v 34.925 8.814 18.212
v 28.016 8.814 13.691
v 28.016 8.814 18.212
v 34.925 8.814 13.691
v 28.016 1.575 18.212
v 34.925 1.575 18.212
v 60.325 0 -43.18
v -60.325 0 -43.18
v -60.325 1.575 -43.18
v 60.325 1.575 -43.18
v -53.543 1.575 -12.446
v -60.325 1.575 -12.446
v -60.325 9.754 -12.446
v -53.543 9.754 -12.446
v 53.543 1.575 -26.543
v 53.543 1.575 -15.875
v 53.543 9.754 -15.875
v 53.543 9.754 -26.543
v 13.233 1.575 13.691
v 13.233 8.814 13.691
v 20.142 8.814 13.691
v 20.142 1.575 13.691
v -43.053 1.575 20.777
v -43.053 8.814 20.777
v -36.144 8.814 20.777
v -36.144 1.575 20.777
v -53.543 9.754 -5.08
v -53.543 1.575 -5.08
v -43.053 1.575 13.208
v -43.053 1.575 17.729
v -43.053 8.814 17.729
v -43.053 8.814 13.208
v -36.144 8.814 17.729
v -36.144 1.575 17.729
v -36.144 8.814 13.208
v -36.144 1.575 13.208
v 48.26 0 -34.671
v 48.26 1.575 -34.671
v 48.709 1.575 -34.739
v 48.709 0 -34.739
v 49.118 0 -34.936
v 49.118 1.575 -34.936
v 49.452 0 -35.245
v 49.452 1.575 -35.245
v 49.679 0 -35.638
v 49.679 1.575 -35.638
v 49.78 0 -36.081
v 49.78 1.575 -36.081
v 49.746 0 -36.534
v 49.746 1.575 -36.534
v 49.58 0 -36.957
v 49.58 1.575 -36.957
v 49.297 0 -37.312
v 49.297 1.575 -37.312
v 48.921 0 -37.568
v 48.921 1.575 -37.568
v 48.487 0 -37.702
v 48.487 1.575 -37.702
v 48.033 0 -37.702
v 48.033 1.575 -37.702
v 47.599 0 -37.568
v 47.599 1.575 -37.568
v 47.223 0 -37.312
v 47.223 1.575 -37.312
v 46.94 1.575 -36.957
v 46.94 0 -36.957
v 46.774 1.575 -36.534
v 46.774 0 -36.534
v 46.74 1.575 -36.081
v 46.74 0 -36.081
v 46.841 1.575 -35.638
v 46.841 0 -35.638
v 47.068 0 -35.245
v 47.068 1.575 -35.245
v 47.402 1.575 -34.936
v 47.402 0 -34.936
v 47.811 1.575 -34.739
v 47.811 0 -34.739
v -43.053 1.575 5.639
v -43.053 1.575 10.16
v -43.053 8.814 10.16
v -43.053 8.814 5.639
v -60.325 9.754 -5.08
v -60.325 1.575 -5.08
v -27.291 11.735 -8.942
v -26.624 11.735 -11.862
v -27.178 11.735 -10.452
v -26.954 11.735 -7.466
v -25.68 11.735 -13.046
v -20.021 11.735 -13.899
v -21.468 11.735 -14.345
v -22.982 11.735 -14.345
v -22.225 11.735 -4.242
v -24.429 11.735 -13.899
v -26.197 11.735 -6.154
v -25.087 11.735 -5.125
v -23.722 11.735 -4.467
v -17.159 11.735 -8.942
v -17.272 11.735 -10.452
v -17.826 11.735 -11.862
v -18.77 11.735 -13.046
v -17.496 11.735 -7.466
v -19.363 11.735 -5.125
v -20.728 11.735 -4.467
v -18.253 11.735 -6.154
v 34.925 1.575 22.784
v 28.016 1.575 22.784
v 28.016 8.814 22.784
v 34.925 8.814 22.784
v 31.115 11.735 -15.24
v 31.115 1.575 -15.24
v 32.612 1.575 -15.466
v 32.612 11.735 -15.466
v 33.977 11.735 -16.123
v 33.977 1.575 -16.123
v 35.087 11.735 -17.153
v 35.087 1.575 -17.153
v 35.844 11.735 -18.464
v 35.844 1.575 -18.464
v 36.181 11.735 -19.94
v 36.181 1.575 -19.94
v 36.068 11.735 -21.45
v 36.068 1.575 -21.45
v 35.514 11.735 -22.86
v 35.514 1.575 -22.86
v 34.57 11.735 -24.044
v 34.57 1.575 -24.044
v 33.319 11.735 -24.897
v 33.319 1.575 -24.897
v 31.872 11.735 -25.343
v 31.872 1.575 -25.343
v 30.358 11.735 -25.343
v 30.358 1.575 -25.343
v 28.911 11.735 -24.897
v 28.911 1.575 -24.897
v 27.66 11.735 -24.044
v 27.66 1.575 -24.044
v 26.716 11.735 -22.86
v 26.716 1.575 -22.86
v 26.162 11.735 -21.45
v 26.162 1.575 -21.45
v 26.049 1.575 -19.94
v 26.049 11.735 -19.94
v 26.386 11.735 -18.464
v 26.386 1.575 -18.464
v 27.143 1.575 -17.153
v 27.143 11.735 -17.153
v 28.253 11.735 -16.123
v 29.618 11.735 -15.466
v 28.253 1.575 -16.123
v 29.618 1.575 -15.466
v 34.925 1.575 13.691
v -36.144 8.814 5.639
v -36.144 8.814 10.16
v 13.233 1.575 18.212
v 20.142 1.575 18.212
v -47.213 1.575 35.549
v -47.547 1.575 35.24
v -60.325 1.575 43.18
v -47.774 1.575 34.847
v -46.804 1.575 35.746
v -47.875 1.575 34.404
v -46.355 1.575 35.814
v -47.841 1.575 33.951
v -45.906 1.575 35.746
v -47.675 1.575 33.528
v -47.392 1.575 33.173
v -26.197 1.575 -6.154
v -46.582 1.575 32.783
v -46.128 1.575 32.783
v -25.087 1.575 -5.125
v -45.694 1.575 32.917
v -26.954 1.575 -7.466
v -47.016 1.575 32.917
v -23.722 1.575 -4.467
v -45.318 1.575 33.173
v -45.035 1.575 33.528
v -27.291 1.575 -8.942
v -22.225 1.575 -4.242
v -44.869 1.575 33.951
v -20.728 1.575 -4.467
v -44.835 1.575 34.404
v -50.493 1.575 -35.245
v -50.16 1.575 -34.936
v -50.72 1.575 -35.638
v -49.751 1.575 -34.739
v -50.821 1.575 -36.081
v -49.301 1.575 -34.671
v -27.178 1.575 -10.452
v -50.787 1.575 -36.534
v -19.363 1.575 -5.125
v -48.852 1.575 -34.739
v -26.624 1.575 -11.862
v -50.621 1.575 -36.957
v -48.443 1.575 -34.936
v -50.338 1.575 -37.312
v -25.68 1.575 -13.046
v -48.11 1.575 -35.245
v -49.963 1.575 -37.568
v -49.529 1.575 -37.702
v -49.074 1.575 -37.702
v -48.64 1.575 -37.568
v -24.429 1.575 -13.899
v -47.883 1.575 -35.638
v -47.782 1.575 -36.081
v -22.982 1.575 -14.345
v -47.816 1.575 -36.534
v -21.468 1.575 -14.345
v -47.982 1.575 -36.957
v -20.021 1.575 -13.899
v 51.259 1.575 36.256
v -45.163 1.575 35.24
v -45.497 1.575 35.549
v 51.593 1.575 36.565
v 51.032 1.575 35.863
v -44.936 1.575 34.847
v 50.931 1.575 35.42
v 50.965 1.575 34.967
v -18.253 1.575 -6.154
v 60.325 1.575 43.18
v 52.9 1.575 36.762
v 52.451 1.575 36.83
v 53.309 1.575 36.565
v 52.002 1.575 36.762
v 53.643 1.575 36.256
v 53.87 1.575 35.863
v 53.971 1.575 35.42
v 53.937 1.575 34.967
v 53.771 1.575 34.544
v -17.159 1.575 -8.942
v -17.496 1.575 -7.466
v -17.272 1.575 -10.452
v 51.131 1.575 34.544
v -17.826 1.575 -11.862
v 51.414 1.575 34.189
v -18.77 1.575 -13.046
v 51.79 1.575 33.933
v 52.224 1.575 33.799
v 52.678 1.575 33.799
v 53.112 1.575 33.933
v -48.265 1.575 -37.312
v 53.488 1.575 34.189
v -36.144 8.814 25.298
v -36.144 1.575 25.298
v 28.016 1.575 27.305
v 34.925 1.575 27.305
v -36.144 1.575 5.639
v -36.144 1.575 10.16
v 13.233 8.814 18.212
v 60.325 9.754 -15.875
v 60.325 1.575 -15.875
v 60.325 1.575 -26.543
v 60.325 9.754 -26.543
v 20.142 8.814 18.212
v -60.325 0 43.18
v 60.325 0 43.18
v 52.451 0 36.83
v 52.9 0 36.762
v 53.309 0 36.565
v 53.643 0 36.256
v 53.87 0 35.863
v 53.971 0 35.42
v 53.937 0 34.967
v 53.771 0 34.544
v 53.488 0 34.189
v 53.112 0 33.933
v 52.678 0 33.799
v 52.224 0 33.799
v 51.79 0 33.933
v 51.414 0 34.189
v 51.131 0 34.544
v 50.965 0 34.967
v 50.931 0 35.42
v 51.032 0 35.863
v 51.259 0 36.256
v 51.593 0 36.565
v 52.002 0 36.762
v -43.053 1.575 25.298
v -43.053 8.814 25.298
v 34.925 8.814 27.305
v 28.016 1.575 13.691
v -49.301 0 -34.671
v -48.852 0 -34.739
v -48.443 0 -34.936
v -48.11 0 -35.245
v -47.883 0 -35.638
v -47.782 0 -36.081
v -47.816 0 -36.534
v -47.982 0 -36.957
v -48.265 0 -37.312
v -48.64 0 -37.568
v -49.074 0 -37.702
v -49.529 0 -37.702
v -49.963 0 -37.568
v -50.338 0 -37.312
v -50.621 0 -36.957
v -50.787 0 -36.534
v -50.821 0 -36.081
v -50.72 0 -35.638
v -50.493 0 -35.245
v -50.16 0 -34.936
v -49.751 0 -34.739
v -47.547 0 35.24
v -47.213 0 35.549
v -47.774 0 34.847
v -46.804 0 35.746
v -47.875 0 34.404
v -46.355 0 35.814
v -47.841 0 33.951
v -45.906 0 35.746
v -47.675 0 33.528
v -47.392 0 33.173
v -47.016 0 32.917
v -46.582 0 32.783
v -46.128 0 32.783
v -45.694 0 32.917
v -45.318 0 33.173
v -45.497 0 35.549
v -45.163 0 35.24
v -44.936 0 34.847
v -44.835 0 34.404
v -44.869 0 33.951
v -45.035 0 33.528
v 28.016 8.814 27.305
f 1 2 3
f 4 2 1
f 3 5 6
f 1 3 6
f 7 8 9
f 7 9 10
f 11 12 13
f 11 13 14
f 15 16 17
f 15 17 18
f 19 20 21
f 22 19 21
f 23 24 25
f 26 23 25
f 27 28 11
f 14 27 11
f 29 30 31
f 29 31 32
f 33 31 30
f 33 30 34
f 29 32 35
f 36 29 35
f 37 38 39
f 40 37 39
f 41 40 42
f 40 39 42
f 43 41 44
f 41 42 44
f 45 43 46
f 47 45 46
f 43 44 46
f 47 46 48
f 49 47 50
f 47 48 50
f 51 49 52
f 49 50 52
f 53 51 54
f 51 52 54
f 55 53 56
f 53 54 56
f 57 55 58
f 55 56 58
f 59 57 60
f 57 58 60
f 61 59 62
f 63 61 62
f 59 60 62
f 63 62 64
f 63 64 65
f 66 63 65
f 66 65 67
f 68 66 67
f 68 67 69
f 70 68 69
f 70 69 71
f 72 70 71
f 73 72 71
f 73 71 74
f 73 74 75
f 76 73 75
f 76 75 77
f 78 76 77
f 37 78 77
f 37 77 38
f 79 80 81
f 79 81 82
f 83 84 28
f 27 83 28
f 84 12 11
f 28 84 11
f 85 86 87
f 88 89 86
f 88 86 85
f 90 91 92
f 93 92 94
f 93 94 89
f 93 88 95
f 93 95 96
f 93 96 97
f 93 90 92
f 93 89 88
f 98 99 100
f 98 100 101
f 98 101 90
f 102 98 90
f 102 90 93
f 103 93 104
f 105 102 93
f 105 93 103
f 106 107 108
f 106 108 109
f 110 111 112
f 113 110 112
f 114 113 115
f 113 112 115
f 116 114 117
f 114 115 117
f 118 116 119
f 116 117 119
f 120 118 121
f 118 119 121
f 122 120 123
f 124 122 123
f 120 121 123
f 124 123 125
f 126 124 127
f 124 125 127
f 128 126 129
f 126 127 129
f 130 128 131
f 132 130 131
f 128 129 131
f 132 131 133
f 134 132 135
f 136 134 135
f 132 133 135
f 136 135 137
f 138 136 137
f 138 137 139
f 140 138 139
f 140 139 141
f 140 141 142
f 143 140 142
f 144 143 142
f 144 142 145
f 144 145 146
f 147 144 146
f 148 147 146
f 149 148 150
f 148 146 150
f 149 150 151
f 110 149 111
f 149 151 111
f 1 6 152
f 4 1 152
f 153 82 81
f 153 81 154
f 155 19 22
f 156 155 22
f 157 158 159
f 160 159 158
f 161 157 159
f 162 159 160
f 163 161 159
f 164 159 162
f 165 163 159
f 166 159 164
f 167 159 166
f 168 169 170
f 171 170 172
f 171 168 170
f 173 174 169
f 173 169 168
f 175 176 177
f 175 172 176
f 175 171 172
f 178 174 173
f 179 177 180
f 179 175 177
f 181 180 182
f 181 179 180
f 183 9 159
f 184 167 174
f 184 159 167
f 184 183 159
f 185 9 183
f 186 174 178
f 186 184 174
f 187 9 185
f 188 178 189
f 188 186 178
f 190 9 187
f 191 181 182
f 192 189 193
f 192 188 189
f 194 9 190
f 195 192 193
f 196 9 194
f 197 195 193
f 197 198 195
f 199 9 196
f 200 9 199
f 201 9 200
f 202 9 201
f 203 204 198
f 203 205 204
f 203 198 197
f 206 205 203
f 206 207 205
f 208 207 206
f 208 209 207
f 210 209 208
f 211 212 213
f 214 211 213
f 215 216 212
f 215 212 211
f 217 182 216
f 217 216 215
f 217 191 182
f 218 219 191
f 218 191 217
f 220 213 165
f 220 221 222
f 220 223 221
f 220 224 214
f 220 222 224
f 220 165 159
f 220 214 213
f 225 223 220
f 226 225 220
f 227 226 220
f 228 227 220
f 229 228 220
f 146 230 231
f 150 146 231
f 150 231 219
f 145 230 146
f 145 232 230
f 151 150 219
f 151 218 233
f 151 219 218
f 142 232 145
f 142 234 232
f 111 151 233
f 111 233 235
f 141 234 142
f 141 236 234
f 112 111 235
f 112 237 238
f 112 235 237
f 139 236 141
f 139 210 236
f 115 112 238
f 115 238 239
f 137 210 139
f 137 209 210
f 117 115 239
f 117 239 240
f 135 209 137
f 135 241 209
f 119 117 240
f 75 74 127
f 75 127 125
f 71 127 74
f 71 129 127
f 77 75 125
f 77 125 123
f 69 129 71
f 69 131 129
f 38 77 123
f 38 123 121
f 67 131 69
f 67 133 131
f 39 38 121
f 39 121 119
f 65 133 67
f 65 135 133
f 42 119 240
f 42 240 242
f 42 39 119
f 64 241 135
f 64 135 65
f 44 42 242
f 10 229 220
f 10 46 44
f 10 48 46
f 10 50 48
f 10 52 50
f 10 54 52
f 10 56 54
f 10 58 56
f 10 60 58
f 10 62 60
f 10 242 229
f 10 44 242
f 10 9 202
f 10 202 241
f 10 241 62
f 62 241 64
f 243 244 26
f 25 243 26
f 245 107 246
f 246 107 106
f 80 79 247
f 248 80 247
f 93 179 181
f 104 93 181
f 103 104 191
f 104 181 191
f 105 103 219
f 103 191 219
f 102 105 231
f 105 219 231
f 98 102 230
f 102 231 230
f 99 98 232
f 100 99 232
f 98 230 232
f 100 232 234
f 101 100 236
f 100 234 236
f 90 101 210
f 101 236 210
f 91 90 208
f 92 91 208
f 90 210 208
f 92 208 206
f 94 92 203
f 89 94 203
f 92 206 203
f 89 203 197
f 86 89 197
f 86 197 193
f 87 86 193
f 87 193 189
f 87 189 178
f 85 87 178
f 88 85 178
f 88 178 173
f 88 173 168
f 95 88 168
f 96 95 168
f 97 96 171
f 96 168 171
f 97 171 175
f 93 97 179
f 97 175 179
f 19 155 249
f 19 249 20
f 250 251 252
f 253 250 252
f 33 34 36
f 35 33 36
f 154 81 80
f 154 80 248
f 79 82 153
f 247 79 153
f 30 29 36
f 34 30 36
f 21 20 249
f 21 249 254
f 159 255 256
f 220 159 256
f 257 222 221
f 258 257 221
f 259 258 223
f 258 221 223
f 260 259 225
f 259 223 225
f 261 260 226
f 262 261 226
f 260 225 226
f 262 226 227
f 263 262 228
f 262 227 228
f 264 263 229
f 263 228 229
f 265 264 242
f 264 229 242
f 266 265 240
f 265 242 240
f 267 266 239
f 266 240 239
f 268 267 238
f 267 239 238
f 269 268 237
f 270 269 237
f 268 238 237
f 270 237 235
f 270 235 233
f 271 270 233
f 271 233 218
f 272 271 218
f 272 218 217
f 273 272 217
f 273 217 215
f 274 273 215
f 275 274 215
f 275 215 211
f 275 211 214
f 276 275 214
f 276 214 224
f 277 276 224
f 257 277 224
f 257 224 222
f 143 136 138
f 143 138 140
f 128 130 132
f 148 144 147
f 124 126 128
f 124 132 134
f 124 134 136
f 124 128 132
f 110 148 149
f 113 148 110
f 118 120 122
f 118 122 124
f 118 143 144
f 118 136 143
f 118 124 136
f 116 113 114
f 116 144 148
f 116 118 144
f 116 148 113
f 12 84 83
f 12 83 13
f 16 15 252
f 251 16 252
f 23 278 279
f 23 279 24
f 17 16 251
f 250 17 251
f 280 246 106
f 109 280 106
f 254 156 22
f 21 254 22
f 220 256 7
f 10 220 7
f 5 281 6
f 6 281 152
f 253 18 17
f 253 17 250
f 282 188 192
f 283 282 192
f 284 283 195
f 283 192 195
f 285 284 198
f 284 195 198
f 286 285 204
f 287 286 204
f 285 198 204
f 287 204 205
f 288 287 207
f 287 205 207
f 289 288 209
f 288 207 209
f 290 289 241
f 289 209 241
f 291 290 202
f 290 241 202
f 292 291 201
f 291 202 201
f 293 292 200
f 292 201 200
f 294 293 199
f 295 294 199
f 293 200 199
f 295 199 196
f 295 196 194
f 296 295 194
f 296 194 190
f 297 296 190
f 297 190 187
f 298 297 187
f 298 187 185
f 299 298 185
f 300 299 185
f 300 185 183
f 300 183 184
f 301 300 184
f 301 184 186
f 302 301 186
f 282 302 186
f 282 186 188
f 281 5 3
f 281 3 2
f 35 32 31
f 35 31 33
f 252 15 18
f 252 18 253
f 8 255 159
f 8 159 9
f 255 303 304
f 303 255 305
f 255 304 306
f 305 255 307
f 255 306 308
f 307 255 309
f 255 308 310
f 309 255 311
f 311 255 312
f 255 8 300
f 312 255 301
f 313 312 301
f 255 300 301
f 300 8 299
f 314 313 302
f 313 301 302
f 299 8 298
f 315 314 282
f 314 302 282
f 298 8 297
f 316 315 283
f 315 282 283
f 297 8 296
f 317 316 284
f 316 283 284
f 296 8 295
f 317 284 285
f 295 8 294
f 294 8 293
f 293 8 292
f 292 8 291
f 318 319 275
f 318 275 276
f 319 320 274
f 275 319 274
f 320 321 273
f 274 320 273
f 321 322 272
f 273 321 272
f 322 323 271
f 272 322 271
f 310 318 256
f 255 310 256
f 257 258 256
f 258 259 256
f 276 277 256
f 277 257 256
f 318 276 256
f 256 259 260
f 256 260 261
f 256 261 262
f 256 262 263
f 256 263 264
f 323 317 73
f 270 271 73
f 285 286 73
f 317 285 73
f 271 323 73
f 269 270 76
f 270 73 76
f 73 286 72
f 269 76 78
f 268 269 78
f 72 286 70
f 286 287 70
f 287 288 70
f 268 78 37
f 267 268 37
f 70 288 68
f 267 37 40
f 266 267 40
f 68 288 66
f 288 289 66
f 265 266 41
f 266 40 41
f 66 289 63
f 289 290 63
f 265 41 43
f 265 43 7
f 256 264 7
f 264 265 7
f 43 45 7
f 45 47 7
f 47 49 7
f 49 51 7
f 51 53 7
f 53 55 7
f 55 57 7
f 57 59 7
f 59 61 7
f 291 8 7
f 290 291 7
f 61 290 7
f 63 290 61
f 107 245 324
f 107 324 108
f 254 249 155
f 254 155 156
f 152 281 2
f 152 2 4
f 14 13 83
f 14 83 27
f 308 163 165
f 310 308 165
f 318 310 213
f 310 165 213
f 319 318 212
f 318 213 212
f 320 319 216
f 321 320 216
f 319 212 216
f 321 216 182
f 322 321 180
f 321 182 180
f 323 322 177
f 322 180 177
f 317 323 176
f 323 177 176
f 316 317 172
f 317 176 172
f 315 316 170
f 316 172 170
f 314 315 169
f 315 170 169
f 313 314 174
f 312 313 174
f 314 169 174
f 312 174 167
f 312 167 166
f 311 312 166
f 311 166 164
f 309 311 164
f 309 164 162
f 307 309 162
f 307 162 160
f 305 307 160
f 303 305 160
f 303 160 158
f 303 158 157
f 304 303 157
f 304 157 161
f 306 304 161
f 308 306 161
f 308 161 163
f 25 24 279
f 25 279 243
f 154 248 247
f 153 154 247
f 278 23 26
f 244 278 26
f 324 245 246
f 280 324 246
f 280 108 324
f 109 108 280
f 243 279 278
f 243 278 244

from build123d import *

# Parameters (mm, degrees)
SKETCH1_W          = 120.65
SKETCH1_H          = 86.36
PCB_DEPTH          = 1.5748
SKETCH2_R          = 5.08
CAPACITORS_DEPTH   = 10.16
SKETCH3_W          = 6.7818
SKETCH3_H          = 7.366
CONNECTORS_DEPTH   = 8.1788
SKETCH3_H_2        = 10.668
CONNECTORS_2_DEPTH = 8.1788
SKETCH4_W          = 6.9088
SKETCH4_H          = 4.5212
POTS_DEPTH         = 7.239
POTS_2_DEPTH       = 7.239
POTS_3_DEPTH       = 7.239
POTS_4_DEPTH       = 7.239
POTS_5_DEPTH       = 7.239
POTS_6_DEPTH       = 7.239
SKETCH5_R          = 1.524
CUT_EXTRUDE1_DEPTH = 75.878859667


with BuildPart() as part:
    # Sketch1 → PCB (new body)
    with BuildSketch(Plane(origin=(0, 0, 0), x_dir=(1, 0, 0), z_dir=(0, 1, 0))):
        Rectangle(SKETCH1_W, SKETCH1_H)
    extrude(amount=PCB_DEPTH)

    # Sketch2 → Capacitors (add)
    with BuildSketch(Plane(origin=(0, 1.5748, 0), x_dir=(1, 0, 0), z_dir=(0, 1, 0))):
        with Locations(Location((-22.225, 9.3218, 0), (0, 0, 270))):
            Circle(SKETCH2_R)
        with Locations(Location((31.115, 20.32, 0), (0, 0, 270))):
            Circle(SKETCH2_R)
    extrude(amount=CAPACITORS_DEPTH)

    # Sketch5 → Cut-Extrude1 (cut, through all)
    with BuildSketch(Plane(origin=(0, 1.5748, 0), x_dir=(1, 0, 0), z_dir=(0, 1, 0))):
        with Locations(Location((-49.3014, 36.195, 0), (0, 0, 270))):
            Circle(SKETCH5_R)
        with Locations(Location((48.26, 36.195, 0), (0, 0, 270))):
            Circle(SKETCH5_R)
        with Locations(Location((-46.355, -34.29, 0), (0, 0, 270))):
            Circle(SKETCH5_R)
        with Locations(Location((52.451, -35.306, 0), (0, 0, 270))):
            Circle(SKETCH5_R)
    extrude(amount=-CUT_EXTRUDE1_DEPTH, mode=Mode.SUBTRACT)


with BuildPart() as body_2:
    # Sketch3 → Connectors (new body)
    with BuildSketch(Plane(origin=(0, 1.5748, 0), x_dir=(1, 0, 0), z_dir=(0, 1, 0))):
        with Locations((-56.9341, 8.763)):
            Rectangle(SKETCH3_W, SKETCH3_H)
    extrude(amount=CONNECTORS_DEPTH)


with BuildPart() as body_3:
    # Sketch3 → Connectors 2 (new body)
    with BuildSketch(Plane(origin=(0, 1.5748, 0), x_dir=(1, 0, 0), z_dir=(0, 1, 0))):
        with Locations((56.9341, 21.209)):
            Rectangle(SKETCH3_W, SKETCH3_H_2)
    extrude(amount=CONNECTORS_2_DEPTH)


with BuildPart() as body_4:
    # Sketch4 → Pots (new body)
    with BuildSketch(Plane(origin=(0, 1.5748, 0), x_dir=(1, 0, 0), z_dir=(0, 1, 0))):
        with Locations((-39.5986, -7.8994)):
            Rectangle(SKETCH4_W, SKETCH4_H)
    extrude(amount=POTS_DEPTH)


with BuildPart() as body_5:
    # Sketch4 → Pots 2 (new body)
    with BuildSketch(Plane(origin=(0, 1.5748, 0), x_dir=(1, 0, 0), z_dir=(0, 1, 0))):
        with Locations((-39.5986, -15.4686)):
            Rectangle(SKETCH4_W, SKETCH4_H)
    extrude(amount=POTS_2_DEPTH)


with BuildPart() as body_6:
    # Sketch4 → Pots 3 (new body)
    with BuildSketch(Plane(origin=(0, 1.5748, 0), x_dir=(1, 0, 0), z_dir=(0, 1, 0))):
        with Locations((-39.5986, -23.0378)):
            Rectangle(SKETCH4_W, SKETCH4_H)
    extrude(amount=POTS_3_DEPTH)


with BuildPart() as body_7:
    # Sketch4 → Pots 4 (new body)
    with BuildSketch(Plane(origin=(0, 1.5748, 0), x_dir=(1, 0, 0), z_dir=(0, 1, 0))):
        with Locations((31.4706, -15.9512)):
            Rectangle(SKETCH4_W, SKETCH4_H)
    extrude(amount=POTS_4_DEPTH)


with BuildPart() as body_8:
    # Sketch4 → Pots 5 (new body)
    with BuildSketch(Plane(origin=(0, 1.5748, 0), x_dir=(1, 0, 0), z_dir=(0, 1, 0))):
        with Locations((31.4706, -25.0444)):
            Rectangle(SKETCH4_W, SKETCH4_H)
    extrude(amount=POTS_5_DEPTH)


with BuildPart() as body_9:
    # Sketch4 → Pots 6 (new body)
    with BuildSketch(Plane(origin=(0, 1.5748, 0), x_dir=(1, 0, 0), z_dir=(0, 1, 0))):
        with Locations((16.6878, -15.9512)):
            Rectangle(SKETCH4_W, SKETCH4_H)
    extrude(amount=POTS_6_DEPTH)


solid = Compound([part.part, body_2.part, body_3.part, body_4.part, body_5.part, body_6.part, body_7.part, body_8.part, body_9.part])
